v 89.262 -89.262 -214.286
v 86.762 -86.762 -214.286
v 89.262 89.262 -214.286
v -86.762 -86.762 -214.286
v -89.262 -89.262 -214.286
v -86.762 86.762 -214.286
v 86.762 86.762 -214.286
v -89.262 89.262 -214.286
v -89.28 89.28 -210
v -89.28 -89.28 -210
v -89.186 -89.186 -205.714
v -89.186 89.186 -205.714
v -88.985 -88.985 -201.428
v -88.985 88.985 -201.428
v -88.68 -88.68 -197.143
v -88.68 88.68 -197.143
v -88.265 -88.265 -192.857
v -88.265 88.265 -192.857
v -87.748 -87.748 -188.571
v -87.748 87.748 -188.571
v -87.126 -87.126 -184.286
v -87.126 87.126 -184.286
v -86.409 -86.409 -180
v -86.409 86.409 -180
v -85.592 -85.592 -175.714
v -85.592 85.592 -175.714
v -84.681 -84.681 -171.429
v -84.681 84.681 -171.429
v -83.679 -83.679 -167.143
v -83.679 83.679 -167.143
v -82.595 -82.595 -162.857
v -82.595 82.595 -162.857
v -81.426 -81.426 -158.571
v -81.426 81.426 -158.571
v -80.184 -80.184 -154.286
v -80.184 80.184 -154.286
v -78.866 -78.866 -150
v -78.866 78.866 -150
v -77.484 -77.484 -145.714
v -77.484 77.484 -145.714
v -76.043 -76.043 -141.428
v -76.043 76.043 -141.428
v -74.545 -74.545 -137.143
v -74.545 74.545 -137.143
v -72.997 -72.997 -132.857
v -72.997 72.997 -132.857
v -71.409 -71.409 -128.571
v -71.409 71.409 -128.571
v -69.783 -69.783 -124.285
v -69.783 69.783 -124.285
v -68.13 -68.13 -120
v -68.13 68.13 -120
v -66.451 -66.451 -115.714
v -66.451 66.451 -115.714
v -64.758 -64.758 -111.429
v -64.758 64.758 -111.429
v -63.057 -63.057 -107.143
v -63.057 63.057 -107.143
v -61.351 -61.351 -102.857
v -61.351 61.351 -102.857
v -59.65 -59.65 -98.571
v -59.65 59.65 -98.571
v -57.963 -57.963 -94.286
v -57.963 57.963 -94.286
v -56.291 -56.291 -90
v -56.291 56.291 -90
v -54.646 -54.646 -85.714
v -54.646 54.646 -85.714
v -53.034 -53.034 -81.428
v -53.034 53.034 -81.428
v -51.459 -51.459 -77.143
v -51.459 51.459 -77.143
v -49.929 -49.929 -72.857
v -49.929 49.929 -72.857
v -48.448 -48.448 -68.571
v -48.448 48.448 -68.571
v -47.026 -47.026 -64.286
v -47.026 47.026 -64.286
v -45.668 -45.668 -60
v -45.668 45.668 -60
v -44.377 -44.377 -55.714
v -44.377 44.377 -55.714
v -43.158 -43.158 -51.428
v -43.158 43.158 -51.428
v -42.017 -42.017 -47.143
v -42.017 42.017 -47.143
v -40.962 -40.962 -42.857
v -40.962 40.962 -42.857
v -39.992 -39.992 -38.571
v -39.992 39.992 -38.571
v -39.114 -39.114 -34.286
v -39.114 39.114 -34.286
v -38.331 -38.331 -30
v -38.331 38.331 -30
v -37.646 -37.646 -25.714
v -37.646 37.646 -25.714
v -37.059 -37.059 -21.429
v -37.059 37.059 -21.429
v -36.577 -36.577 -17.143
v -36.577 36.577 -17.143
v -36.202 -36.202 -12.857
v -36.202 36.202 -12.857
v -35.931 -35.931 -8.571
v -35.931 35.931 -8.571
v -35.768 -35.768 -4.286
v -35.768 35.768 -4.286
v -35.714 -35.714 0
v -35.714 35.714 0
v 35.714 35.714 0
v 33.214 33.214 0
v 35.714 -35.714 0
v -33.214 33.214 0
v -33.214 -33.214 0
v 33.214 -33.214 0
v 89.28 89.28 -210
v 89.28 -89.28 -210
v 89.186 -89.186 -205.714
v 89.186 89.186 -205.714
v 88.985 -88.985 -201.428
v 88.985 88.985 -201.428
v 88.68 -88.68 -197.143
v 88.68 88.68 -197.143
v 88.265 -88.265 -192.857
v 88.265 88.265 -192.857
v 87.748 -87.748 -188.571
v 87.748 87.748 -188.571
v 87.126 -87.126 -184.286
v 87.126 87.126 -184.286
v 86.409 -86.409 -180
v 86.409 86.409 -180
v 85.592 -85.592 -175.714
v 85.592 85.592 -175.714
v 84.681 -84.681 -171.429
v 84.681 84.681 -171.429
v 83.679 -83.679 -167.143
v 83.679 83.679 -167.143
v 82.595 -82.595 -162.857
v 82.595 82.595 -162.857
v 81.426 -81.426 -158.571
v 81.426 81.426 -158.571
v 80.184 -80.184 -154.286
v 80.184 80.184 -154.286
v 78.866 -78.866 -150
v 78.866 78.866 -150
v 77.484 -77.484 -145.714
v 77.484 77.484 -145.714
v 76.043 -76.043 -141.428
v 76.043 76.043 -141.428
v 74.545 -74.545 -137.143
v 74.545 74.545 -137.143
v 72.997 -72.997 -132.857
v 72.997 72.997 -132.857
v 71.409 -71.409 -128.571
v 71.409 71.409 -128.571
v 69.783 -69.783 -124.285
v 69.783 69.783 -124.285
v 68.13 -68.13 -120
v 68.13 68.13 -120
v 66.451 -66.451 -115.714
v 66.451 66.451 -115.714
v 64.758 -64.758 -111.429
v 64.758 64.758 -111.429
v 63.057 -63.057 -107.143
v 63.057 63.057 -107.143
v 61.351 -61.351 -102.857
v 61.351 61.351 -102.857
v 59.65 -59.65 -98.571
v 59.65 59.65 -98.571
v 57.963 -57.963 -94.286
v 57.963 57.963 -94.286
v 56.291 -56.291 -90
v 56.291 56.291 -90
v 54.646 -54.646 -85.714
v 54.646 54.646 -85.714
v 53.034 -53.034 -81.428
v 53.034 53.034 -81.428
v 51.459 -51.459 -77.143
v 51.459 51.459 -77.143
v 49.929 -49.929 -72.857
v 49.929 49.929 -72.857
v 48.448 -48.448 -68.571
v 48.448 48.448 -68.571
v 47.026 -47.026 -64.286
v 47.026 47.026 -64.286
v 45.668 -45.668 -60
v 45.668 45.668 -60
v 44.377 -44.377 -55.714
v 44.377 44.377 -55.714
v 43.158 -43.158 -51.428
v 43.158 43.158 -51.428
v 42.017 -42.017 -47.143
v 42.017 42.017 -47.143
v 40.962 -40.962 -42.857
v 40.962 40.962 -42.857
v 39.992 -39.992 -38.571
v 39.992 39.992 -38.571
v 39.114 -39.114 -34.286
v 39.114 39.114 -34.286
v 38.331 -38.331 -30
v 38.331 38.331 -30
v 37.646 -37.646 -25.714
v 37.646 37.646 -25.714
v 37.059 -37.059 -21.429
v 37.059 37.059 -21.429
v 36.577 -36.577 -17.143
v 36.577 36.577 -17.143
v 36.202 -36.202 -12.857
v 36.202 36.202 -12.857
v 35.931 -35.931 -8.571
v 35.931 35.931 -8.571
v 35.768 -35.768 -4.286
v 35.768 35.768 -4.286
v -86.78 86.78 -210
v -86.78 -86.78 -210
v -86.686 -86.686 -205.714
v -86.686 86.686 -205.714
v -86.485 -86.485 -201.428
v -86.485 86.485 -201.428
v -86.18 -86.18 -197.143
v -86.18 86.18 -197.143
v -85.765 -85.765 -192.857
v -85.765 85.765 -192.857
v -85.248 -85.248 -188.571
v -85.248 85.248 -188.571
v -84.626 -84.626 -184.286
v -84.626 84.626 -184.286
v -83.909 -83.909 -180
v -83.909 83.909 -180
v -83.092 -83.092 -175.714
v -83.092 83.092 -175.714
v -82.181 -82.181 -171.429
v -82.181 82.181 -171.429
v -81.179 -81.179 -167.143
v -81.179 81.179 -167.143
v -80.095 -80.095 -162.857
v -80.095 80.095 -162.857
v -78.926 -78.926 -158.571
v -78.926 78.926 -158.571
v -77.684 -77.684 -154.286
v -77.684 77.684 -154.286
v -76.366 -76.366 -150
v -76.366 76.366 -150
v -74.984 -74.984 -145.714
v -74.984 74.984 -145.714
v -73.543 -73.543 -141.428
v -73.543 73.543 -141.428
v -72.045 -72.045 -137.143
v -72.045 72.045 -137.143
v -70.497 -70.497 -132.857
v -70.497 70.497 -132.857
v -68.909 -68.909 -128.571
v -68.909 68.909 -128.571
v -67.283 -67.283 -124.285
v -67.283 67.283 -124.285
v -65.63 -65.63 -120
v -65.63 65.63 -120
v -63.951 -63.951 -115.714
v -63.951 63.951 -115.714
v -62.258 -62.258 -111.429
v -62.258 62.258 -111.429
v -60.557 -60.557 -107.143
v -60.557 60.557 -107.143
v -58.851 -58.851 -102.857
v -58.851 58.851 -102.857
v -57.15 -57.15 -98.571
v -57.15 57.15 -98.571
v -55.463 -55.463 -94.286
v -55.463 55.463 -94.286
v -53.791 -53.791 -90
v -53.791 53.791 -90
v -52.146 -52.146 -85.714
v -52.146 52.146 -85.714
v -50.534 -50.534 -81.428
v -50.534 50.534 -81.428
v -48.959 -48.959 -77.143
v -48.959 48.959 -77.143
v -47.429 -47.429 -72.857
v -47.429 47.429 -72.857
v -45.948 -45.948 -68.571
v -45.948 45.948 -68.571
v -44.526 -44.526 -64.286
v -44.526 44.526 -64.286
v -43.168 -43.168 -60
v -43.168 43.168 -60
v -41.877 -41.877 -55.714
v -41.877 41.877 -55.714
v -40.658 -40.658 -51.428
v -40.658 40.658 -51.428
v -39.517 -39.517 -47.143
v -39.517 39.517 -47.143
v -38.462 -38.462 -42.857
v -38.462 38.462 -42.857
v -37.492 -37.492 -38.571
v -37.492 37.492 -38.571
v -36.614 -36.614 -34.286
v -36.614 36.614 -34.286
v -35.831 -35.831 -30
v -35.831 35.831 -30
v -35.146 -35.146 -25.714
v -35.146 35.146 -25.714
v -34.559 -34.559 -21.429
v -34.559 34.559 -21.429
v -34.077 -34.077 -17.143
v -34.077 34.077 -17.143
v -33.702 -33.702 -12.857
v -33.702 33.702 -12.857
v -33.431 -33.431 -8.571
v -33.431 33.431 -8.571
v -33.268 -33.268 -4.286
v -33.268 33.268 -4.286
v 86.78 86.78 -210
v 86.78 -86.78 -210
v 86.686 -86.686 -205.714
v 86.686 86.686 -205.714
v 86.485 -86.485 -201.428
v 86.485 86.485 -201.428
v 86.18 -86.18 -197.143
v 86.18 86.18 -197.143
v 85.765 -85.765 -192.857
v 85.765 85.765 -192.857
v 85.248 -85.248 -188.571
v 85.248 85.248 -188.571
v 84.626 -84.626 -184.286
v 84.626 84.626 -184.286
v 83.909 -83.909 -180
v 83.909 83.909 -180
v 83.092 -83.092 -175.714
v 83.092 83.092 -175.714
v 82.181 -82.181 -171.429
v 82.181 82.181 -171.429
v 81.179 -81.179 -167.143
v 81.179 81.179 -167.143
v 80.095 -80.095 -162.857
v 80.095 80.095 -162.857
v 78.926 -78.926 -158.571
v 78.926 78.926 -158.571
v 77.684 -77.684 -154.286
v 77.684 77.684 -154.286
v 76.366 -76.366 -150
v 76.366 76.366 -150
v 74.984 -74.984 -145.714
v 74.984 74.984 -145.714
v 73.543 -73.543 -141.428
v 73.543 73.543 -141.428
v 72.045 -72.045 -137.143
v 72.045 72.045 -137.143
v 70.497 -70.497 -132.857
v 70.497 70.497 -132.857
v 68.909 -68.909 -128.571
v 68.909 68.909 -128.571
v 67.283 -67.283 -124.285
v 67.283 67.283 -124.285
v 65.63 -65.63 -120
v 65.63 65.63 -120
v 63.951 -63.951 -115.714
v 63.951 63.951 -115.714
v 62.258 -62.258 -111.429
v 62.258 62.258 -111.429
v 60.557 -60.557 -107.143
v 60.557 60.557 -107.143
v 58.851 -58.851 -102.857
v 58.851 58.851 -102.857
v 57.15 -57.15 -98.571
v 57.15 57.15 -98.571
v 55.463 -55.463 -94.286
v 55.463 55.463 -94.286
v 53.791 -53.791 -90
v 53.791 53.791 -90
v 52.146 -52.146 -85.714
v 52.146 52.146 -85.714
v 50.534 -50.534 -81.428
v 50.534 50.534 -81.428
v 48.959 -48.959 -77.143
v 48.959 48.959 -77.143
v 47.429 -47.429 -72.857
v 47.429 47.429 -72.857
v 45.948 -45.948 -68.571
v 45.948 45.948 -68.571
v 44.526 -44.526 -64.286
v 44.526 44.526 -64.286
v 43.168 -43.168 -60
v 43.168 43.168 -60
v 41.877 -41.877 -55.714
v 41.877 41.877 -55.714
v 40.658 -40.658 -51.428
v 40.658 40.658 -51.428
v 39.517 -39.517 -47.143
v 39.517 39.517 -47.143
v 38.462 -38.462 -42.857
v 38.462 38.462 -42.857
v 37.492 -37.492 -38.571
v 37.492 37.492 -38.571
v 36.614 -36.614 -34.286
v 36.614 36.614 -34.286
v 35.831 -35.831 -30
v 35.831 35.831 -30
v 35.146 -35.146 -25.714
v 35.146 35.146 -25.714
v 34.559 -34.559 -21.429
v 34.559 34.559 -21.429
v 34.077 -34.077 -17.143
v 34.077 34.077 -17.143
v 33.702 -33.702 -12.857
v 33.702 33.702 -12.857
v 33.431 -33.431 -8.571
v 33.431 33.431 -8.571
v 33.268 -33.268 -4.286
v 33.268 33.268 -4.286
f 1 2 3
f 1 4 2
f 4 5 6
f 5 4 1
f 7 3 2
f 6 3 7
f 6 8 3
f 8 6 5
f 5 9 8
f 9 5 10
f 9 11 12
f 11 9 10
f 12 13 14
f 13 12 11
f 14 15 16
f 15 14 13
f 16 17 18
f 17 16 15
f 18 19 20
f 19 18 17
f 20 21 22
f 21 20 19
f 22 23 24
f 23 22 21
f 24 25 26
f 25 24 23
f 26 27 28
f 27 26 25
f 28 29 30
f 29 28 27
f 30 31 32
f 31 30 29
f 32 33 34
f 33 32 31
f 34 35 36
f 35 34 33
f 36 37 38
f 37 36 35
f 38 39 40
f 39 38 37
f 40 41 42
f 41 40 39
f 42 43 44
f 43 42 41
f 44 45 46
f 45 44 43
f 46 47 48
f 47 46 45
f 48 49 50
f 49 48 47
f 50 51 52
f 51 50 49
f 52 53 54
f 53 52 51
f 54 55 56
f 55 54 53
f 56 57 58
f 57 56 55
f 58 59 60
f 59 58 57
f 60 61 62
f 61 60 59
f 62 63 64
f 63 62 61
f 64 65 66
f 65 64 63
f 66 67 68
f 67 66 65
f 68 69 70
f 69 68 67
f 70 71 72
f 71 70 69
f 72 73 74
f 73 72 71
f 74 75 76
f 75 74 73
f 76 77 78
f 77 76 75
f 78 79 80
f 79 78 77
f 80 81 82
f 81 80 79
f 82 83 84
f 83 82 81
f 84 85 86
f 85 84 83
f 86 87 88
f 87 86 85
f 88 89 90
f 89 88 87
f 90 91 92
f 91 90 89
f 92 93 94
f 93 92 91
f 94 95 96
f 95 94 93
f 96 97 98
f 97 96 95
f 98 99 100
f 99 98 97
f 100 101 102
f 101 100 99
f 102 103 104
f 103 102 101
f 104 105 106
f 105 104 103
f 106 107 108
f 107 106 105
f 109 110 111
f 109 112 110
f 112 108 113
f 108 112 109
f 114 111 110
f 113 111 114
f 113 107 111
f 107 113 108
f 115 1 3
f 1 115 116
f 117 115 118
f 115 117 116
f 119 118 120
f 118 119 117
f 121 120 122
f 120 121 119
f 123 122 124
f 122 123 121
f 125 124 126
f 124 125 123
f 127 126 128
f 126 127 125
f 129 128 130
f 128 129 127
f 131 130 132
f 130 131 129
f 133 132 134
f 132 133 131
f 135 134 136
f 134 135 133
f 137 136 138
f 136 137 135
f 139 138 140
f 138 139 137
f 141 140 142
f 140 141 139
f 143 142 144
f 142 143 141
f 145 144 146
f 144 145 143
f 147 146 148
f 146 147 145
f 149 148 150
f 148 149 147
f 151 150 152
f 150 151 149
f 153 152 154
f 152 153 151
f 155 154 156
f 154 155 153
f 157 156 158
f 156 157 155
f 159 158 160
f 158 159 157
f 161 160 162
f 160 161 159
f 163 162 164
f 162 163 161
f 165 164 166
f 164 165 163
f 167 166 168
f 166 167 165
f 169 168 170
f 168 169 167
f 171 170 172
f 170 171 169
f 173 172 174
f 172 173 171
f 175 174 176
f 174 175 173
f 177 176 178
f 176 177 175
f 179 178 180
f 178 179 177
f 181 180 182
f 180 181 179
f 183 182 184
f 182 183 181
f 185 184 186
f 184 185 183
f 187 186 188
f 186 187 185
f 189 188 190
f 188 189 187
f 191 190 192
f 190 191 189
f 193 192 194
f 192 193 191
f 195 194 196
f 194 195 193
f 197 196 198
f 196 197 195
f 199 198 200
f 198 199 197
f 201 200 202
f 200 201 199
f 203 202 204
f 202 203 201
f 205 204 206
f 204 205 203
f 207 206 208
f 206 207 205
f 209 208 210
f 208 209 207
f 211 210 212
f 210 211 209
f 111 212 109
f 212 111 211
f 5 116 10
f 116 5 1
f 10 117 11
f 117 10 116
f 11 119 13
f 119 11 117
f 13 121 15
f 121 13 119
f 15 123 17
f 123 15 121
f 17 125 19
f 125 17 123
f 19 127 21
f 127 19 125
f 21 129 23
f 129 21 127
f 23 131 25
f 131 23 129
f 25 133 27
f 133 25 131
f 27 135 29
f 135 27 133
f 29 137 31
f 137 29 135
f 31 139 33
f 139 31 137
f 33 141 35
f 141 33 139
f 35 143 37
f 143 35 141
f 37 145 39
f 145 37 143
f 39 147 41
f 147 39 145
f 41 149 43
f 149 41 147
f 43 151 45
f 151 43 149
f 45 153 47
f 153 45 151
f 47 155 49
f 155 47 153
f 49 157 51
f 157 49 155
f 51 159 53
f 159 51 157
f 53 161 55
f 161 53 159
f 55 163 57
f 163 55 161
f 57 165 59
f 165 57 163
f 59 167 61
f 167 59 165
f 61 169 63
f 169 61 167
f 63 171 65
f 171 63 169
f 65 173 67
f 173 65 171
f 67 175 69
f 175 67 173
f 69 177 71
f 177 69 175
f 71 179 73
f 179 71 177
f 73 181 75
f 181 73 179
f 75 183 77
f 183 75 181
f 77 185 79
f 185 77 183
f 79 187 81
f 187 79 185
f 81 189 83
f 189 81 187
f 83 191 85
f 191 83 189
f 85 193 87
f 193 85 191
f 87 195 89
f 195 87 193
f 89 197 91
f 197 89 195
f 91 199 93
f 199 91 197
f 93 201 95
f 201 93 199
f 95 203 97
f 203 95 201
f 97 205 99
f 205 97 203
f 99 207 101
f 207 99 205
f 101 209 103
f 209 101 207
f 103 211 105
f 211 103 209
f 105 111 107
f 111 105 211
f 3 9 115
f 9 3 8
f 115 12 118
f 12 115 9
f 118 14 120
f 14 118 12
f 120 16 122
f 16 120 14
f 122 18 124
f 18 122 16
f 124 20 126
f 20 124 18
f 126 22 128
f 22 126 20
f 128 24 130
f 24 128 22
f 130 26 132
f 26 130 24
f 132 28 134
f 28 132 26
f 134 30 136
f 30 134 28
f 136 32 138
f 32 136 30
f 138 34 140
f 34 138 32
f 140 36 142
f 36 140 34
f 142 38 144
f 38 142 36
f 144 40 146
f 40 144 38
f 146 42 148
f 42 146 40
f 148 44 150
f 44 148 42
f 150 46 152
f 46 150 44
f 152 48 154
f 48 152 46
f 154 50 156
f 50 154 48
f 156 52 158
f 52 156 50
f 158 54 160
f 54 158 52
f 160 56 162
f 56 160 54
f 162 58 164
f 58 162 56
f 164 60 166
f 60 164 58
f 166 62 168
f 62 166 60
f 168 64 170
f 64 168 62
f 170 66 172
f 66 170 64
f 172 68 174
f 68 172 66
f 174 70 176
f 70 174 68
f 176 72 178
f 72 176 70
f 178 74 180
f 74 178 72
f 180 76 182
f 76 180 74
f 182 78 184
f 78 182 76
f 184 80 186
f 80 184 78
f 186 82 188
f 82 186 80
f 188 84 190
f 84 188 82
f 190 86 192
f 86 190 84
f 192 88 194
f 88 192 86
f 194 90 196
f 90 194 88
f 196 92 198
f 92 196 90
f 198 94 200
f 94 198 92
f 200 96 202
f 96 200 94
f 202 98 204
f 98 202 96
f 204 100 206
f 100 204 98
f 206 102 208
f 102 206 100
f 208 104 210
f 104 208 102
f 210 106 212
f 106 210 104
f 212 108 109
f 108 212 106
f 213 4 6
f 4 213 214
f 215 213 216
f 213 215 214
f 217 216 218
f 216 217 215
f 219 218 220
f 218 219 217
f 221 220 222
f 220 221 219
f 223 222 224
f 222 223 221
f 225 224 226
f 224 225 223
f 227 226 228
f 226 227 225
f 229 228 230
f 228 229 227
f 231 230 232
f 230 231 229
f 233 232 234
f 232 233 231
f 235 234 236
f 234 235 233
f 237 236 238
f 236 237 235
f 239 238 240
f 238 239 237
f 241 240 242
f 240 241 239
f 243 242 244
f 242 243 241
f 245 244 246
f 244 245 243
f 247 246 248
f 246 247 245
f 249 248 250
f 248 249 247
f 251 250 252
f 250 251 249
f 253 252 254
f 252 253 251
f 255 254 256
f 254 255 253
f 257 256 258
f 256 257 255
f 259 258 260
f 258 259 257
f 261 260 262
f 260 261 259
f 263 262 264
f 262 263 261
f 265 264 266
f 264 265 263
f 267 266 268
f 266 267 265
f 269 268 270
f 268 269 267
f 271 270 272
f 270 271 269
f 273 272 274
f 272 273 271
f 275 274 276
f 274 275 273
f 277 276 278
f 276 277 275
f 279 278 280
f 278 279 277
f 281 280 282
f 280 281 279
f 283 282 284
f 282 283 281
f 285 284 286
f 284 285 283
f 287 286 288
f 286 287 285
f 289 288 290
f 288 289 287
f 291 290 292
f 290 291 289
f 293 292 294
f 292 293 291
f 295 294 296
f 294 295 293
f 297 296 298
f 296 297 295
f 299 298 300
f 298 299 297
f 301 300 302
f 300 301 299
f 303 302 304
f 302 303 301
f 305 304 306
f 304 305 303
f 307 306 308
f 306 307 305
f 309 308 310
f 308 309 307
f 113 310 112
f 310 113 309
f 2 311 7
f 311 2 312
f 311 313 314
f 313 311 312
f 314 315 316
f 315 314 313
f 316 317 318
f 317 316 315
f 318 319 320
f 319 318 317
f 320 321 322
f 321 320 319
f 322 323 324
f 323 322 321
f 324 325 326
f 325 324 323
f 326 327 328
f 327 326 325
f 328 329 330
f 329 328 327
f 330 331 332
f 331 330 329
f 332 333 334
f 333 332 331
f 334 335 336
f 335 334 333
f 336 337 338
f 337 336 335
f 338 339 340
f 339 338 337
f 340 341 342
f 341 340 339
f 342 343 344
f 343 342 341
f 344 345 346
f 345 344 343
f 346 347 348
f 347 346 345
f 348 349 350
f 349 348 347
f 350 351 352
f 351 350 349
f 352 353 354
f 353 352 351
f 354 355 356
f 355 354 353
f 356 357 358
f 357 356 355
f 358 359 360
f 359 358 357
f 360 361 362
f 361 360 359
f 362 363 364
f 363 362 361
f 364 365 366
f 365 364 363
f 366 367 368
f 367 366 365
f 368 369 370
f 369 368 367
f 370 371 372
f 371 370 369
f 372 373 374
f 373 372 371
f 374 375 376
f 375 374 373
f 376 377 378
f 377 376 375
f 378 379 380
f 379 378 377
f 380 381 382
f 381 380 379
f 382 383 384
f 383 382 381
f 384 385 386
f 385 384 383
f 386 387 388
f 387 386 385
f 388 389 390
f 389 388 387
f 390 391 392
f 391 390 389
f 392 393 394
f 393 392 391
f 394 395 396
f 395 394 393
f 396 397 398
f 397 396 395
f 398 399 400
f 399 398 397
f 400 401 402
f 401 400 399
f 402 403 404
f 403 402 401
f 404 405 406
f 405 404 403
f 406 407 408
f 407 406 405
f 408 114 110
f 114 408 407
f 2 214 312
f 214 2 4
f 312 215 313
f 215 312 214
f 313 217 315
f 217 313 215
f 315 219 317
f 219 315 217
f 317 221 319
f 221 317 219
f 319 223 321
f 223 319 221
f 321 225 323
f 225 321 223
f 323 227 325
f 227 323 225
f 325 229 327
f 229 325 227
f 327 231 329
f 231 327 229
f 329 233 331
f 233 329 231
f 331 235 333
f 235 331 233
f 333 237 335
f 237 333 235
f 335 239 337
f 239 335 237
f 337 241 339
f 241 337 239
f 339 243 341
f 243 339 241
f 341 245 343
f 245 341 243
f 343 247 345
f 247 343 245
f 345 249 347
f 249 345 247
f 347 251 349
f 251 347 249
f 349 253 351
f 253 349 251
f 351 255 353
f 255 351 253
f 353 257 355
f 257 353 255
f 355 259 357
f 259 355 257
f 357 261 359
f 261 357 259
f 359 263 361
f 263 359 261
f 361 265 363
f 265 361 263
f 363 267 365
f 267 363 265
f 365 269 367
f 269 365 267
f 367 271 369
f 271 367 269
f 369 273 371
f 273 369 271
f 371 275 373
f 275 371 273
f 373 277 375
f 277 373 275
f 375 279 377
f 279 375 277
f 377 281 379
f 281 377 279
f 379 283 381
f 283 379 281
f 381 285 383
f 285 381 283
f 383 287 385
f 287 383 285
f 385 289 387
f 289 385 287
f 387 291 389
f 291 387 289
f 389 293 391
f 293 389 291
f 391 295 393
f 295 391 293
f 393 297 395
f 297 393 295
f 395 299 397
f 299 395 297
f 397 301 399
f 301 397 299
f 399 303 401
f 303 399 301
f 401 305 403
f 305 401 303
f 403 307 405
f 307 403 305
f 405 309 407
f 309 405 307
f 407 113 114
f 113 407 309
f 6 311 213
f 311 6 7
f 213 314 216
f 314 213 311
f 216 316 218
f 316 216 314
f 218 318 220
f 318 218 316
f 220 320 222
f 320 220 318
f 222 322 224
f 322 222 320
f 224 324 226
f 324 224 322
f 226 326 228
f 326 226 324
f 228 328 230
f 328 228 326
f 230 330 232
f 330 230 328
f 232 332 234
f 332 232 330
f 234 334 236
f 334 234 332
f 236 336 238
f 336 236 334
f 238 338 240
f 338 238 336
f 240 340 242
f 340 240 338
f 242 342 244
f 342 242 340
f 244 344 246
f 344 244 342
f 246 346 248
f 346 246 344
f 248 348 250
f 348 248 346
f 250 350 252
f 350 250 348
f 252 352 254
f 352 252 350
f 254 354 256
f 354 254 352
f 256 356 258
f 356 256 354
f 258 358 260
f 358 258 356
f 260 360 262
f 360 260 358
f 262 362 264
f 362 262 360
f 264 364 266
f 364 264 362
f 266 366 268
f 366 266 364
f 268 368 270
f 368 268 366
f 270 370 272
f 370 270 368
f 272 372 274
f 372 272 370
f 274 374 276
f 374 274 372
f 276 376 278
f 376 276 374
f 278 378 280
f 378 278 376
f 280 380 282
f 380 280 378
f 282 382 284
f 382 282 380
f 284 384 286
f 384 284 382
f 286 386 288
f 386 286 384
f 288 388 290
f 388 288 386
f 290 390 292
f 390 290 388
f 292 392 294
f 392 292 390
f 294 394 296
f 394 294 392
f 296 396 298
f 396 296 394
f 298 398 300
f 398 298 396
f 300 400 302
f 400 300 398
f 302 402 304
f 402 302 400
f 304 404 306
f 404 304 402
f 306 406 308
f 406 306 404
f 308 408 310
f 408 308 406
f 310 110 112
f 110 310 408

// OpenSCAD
scale([1/14,1/14,1.5/14])
rotate([0,90,0])
difference(){

difference(){
rotate([0,90,0])rotate([0,0,45])
cylinder(d1=2000,d2=4000,h=2000,$fn=4);
translate([0,-875,-2000])scale([200,375,1])curva(4000);
mirror([0,1,0])
translate([0,-875,-2000])scale([200,375,1])curva(4000);
rotate([90,0,0]){
translate([0,-875,-2000])scale([200,375,1])curva(4000);
mirror([0,1,0])
translate([0,-875,-2000])scale([200,375,1])curva(4000);
}
}

difference(){
rotate([0,90,0])rotate([0,0,45])
cylinder(d1=2000,d2=4000,h=2000,$fn=4);
translate([0,-840,-2000])scale([200,375,1])curva(4000);
mirror([0,1,0])
translate([0,-840,-2000])scale([200,375,1])curva(4000);
rotate([90,0,0]){
translate([0,-840,-2000])scale([200,375,1])curva(4000);
mirror([0,1,0])
translate([0,-840,-2000])scale([200,375,1])curva(4000);
}
}

}

module curva(e){
linear_extrude(e)
polygon([[0,1.0000],[0.2000,0.9980],[0.4000,0.9919],
[0.6000,0.9818],[0.8000,0.9678],[1.0000,0.9498],
[1.2000,0.9279],[1.4000,0.9023],[1.6000,0.8731],
[1.8000,0.8403],[2.0000,0.8041],[2.2000,0.7647],
[2.4000,0.7221],[2.6000,0.6766],[2.8000,0.6284],
[3.0000,0.5777],[3.2000,0.5246],[3.4000,0.4693],
[3.6000,0.4122],[3.8000,0.3534],[4.0000,0.2932],
[4.2000,0.2318],[4.4000,0.1694],[4.6000,0.1064],
[4.8000,0.0429],[5.0000,-0.0208],[5.2000,-0.0843],
[5.4000,-0.1475],[5.6000,-0.2102],[5.8000,-0.2719],
[6.0000,-0.3326],[6.2000,-0.3919],[6.4000,-0.4497],
[6.6000,-0.5056],[6.8000,-0.5594],[7.0000,-0.6110],
[7.2000,-0.6602],[7.4000,-0.7066],[7.6000,-0.7502],
[7.8000,-0.7907],[8.0000,-0.8281],[8.2000,-0.8621],
[8.4000,-0.8926],[8.6000,-0.9194],[8.8000,-0.9426],
[9.0000,-0.9619],[9.2000,-0.9774],[9.4000,-0.9888],
[9.6000,-0.9963],[9.8000,-0.9998],[10.0000,-0.9991],
[10.0000,-1.9991],[9.8000,-1.9998],[9.6000,-1.9963],
[9.4000,-1.9888],[9.2000,-1.9774],[9.0000,-1.9619],
[8.8000,-1.9426],[8.6000,-1.9194],[8.4000,-1.8926],
[8.2000,-1.8621],[8.0000,-1.8281],[7.8000,-1.7907],
[7.6000,-1.7502],[7.4000,-1.7066],[7.2000,-1.6602],
[7.0000,-1.6110],[6.8000,-1.5594],[6.6000,-1.5056],
[6.4000,-1.4497],[6.2000,-1.3919],[6.0000,-1.3326],
[5.8000,-1.2719],[5.6000,-1.2102],[5.4000,-1.1475],
[5.2000,-1.0843],[5.0000,-1.0208],[4.8000,.0429-1],
[4.6000,.1064-1],[4.4000,.1694-1],[4.2000,.2318-1],
[4.0000,.2932-1],[3.8000,.3534-1],[3.6000,.4122-1],
[3.4000,.4693-1],[3.2000,.5246-1],[3.0000,.5777-1],
[2.8000,.6284-1],[2.6000,.6766-1],[2.4000,.7221-1],
[2.2000,.7647-1],[2.0000,.8041-1],[1.8000,.8403-1],
[1.6000,.8731-1],[1.4000,.9023-1],[1.2000,.9279-1],
[1.0000,.9498-1],[0.8000,.9678-1],[0.6000,.9818-1],
[0.4000,.9919-1],[0.2000,.9980-1],[0,.0000]
]);
}
